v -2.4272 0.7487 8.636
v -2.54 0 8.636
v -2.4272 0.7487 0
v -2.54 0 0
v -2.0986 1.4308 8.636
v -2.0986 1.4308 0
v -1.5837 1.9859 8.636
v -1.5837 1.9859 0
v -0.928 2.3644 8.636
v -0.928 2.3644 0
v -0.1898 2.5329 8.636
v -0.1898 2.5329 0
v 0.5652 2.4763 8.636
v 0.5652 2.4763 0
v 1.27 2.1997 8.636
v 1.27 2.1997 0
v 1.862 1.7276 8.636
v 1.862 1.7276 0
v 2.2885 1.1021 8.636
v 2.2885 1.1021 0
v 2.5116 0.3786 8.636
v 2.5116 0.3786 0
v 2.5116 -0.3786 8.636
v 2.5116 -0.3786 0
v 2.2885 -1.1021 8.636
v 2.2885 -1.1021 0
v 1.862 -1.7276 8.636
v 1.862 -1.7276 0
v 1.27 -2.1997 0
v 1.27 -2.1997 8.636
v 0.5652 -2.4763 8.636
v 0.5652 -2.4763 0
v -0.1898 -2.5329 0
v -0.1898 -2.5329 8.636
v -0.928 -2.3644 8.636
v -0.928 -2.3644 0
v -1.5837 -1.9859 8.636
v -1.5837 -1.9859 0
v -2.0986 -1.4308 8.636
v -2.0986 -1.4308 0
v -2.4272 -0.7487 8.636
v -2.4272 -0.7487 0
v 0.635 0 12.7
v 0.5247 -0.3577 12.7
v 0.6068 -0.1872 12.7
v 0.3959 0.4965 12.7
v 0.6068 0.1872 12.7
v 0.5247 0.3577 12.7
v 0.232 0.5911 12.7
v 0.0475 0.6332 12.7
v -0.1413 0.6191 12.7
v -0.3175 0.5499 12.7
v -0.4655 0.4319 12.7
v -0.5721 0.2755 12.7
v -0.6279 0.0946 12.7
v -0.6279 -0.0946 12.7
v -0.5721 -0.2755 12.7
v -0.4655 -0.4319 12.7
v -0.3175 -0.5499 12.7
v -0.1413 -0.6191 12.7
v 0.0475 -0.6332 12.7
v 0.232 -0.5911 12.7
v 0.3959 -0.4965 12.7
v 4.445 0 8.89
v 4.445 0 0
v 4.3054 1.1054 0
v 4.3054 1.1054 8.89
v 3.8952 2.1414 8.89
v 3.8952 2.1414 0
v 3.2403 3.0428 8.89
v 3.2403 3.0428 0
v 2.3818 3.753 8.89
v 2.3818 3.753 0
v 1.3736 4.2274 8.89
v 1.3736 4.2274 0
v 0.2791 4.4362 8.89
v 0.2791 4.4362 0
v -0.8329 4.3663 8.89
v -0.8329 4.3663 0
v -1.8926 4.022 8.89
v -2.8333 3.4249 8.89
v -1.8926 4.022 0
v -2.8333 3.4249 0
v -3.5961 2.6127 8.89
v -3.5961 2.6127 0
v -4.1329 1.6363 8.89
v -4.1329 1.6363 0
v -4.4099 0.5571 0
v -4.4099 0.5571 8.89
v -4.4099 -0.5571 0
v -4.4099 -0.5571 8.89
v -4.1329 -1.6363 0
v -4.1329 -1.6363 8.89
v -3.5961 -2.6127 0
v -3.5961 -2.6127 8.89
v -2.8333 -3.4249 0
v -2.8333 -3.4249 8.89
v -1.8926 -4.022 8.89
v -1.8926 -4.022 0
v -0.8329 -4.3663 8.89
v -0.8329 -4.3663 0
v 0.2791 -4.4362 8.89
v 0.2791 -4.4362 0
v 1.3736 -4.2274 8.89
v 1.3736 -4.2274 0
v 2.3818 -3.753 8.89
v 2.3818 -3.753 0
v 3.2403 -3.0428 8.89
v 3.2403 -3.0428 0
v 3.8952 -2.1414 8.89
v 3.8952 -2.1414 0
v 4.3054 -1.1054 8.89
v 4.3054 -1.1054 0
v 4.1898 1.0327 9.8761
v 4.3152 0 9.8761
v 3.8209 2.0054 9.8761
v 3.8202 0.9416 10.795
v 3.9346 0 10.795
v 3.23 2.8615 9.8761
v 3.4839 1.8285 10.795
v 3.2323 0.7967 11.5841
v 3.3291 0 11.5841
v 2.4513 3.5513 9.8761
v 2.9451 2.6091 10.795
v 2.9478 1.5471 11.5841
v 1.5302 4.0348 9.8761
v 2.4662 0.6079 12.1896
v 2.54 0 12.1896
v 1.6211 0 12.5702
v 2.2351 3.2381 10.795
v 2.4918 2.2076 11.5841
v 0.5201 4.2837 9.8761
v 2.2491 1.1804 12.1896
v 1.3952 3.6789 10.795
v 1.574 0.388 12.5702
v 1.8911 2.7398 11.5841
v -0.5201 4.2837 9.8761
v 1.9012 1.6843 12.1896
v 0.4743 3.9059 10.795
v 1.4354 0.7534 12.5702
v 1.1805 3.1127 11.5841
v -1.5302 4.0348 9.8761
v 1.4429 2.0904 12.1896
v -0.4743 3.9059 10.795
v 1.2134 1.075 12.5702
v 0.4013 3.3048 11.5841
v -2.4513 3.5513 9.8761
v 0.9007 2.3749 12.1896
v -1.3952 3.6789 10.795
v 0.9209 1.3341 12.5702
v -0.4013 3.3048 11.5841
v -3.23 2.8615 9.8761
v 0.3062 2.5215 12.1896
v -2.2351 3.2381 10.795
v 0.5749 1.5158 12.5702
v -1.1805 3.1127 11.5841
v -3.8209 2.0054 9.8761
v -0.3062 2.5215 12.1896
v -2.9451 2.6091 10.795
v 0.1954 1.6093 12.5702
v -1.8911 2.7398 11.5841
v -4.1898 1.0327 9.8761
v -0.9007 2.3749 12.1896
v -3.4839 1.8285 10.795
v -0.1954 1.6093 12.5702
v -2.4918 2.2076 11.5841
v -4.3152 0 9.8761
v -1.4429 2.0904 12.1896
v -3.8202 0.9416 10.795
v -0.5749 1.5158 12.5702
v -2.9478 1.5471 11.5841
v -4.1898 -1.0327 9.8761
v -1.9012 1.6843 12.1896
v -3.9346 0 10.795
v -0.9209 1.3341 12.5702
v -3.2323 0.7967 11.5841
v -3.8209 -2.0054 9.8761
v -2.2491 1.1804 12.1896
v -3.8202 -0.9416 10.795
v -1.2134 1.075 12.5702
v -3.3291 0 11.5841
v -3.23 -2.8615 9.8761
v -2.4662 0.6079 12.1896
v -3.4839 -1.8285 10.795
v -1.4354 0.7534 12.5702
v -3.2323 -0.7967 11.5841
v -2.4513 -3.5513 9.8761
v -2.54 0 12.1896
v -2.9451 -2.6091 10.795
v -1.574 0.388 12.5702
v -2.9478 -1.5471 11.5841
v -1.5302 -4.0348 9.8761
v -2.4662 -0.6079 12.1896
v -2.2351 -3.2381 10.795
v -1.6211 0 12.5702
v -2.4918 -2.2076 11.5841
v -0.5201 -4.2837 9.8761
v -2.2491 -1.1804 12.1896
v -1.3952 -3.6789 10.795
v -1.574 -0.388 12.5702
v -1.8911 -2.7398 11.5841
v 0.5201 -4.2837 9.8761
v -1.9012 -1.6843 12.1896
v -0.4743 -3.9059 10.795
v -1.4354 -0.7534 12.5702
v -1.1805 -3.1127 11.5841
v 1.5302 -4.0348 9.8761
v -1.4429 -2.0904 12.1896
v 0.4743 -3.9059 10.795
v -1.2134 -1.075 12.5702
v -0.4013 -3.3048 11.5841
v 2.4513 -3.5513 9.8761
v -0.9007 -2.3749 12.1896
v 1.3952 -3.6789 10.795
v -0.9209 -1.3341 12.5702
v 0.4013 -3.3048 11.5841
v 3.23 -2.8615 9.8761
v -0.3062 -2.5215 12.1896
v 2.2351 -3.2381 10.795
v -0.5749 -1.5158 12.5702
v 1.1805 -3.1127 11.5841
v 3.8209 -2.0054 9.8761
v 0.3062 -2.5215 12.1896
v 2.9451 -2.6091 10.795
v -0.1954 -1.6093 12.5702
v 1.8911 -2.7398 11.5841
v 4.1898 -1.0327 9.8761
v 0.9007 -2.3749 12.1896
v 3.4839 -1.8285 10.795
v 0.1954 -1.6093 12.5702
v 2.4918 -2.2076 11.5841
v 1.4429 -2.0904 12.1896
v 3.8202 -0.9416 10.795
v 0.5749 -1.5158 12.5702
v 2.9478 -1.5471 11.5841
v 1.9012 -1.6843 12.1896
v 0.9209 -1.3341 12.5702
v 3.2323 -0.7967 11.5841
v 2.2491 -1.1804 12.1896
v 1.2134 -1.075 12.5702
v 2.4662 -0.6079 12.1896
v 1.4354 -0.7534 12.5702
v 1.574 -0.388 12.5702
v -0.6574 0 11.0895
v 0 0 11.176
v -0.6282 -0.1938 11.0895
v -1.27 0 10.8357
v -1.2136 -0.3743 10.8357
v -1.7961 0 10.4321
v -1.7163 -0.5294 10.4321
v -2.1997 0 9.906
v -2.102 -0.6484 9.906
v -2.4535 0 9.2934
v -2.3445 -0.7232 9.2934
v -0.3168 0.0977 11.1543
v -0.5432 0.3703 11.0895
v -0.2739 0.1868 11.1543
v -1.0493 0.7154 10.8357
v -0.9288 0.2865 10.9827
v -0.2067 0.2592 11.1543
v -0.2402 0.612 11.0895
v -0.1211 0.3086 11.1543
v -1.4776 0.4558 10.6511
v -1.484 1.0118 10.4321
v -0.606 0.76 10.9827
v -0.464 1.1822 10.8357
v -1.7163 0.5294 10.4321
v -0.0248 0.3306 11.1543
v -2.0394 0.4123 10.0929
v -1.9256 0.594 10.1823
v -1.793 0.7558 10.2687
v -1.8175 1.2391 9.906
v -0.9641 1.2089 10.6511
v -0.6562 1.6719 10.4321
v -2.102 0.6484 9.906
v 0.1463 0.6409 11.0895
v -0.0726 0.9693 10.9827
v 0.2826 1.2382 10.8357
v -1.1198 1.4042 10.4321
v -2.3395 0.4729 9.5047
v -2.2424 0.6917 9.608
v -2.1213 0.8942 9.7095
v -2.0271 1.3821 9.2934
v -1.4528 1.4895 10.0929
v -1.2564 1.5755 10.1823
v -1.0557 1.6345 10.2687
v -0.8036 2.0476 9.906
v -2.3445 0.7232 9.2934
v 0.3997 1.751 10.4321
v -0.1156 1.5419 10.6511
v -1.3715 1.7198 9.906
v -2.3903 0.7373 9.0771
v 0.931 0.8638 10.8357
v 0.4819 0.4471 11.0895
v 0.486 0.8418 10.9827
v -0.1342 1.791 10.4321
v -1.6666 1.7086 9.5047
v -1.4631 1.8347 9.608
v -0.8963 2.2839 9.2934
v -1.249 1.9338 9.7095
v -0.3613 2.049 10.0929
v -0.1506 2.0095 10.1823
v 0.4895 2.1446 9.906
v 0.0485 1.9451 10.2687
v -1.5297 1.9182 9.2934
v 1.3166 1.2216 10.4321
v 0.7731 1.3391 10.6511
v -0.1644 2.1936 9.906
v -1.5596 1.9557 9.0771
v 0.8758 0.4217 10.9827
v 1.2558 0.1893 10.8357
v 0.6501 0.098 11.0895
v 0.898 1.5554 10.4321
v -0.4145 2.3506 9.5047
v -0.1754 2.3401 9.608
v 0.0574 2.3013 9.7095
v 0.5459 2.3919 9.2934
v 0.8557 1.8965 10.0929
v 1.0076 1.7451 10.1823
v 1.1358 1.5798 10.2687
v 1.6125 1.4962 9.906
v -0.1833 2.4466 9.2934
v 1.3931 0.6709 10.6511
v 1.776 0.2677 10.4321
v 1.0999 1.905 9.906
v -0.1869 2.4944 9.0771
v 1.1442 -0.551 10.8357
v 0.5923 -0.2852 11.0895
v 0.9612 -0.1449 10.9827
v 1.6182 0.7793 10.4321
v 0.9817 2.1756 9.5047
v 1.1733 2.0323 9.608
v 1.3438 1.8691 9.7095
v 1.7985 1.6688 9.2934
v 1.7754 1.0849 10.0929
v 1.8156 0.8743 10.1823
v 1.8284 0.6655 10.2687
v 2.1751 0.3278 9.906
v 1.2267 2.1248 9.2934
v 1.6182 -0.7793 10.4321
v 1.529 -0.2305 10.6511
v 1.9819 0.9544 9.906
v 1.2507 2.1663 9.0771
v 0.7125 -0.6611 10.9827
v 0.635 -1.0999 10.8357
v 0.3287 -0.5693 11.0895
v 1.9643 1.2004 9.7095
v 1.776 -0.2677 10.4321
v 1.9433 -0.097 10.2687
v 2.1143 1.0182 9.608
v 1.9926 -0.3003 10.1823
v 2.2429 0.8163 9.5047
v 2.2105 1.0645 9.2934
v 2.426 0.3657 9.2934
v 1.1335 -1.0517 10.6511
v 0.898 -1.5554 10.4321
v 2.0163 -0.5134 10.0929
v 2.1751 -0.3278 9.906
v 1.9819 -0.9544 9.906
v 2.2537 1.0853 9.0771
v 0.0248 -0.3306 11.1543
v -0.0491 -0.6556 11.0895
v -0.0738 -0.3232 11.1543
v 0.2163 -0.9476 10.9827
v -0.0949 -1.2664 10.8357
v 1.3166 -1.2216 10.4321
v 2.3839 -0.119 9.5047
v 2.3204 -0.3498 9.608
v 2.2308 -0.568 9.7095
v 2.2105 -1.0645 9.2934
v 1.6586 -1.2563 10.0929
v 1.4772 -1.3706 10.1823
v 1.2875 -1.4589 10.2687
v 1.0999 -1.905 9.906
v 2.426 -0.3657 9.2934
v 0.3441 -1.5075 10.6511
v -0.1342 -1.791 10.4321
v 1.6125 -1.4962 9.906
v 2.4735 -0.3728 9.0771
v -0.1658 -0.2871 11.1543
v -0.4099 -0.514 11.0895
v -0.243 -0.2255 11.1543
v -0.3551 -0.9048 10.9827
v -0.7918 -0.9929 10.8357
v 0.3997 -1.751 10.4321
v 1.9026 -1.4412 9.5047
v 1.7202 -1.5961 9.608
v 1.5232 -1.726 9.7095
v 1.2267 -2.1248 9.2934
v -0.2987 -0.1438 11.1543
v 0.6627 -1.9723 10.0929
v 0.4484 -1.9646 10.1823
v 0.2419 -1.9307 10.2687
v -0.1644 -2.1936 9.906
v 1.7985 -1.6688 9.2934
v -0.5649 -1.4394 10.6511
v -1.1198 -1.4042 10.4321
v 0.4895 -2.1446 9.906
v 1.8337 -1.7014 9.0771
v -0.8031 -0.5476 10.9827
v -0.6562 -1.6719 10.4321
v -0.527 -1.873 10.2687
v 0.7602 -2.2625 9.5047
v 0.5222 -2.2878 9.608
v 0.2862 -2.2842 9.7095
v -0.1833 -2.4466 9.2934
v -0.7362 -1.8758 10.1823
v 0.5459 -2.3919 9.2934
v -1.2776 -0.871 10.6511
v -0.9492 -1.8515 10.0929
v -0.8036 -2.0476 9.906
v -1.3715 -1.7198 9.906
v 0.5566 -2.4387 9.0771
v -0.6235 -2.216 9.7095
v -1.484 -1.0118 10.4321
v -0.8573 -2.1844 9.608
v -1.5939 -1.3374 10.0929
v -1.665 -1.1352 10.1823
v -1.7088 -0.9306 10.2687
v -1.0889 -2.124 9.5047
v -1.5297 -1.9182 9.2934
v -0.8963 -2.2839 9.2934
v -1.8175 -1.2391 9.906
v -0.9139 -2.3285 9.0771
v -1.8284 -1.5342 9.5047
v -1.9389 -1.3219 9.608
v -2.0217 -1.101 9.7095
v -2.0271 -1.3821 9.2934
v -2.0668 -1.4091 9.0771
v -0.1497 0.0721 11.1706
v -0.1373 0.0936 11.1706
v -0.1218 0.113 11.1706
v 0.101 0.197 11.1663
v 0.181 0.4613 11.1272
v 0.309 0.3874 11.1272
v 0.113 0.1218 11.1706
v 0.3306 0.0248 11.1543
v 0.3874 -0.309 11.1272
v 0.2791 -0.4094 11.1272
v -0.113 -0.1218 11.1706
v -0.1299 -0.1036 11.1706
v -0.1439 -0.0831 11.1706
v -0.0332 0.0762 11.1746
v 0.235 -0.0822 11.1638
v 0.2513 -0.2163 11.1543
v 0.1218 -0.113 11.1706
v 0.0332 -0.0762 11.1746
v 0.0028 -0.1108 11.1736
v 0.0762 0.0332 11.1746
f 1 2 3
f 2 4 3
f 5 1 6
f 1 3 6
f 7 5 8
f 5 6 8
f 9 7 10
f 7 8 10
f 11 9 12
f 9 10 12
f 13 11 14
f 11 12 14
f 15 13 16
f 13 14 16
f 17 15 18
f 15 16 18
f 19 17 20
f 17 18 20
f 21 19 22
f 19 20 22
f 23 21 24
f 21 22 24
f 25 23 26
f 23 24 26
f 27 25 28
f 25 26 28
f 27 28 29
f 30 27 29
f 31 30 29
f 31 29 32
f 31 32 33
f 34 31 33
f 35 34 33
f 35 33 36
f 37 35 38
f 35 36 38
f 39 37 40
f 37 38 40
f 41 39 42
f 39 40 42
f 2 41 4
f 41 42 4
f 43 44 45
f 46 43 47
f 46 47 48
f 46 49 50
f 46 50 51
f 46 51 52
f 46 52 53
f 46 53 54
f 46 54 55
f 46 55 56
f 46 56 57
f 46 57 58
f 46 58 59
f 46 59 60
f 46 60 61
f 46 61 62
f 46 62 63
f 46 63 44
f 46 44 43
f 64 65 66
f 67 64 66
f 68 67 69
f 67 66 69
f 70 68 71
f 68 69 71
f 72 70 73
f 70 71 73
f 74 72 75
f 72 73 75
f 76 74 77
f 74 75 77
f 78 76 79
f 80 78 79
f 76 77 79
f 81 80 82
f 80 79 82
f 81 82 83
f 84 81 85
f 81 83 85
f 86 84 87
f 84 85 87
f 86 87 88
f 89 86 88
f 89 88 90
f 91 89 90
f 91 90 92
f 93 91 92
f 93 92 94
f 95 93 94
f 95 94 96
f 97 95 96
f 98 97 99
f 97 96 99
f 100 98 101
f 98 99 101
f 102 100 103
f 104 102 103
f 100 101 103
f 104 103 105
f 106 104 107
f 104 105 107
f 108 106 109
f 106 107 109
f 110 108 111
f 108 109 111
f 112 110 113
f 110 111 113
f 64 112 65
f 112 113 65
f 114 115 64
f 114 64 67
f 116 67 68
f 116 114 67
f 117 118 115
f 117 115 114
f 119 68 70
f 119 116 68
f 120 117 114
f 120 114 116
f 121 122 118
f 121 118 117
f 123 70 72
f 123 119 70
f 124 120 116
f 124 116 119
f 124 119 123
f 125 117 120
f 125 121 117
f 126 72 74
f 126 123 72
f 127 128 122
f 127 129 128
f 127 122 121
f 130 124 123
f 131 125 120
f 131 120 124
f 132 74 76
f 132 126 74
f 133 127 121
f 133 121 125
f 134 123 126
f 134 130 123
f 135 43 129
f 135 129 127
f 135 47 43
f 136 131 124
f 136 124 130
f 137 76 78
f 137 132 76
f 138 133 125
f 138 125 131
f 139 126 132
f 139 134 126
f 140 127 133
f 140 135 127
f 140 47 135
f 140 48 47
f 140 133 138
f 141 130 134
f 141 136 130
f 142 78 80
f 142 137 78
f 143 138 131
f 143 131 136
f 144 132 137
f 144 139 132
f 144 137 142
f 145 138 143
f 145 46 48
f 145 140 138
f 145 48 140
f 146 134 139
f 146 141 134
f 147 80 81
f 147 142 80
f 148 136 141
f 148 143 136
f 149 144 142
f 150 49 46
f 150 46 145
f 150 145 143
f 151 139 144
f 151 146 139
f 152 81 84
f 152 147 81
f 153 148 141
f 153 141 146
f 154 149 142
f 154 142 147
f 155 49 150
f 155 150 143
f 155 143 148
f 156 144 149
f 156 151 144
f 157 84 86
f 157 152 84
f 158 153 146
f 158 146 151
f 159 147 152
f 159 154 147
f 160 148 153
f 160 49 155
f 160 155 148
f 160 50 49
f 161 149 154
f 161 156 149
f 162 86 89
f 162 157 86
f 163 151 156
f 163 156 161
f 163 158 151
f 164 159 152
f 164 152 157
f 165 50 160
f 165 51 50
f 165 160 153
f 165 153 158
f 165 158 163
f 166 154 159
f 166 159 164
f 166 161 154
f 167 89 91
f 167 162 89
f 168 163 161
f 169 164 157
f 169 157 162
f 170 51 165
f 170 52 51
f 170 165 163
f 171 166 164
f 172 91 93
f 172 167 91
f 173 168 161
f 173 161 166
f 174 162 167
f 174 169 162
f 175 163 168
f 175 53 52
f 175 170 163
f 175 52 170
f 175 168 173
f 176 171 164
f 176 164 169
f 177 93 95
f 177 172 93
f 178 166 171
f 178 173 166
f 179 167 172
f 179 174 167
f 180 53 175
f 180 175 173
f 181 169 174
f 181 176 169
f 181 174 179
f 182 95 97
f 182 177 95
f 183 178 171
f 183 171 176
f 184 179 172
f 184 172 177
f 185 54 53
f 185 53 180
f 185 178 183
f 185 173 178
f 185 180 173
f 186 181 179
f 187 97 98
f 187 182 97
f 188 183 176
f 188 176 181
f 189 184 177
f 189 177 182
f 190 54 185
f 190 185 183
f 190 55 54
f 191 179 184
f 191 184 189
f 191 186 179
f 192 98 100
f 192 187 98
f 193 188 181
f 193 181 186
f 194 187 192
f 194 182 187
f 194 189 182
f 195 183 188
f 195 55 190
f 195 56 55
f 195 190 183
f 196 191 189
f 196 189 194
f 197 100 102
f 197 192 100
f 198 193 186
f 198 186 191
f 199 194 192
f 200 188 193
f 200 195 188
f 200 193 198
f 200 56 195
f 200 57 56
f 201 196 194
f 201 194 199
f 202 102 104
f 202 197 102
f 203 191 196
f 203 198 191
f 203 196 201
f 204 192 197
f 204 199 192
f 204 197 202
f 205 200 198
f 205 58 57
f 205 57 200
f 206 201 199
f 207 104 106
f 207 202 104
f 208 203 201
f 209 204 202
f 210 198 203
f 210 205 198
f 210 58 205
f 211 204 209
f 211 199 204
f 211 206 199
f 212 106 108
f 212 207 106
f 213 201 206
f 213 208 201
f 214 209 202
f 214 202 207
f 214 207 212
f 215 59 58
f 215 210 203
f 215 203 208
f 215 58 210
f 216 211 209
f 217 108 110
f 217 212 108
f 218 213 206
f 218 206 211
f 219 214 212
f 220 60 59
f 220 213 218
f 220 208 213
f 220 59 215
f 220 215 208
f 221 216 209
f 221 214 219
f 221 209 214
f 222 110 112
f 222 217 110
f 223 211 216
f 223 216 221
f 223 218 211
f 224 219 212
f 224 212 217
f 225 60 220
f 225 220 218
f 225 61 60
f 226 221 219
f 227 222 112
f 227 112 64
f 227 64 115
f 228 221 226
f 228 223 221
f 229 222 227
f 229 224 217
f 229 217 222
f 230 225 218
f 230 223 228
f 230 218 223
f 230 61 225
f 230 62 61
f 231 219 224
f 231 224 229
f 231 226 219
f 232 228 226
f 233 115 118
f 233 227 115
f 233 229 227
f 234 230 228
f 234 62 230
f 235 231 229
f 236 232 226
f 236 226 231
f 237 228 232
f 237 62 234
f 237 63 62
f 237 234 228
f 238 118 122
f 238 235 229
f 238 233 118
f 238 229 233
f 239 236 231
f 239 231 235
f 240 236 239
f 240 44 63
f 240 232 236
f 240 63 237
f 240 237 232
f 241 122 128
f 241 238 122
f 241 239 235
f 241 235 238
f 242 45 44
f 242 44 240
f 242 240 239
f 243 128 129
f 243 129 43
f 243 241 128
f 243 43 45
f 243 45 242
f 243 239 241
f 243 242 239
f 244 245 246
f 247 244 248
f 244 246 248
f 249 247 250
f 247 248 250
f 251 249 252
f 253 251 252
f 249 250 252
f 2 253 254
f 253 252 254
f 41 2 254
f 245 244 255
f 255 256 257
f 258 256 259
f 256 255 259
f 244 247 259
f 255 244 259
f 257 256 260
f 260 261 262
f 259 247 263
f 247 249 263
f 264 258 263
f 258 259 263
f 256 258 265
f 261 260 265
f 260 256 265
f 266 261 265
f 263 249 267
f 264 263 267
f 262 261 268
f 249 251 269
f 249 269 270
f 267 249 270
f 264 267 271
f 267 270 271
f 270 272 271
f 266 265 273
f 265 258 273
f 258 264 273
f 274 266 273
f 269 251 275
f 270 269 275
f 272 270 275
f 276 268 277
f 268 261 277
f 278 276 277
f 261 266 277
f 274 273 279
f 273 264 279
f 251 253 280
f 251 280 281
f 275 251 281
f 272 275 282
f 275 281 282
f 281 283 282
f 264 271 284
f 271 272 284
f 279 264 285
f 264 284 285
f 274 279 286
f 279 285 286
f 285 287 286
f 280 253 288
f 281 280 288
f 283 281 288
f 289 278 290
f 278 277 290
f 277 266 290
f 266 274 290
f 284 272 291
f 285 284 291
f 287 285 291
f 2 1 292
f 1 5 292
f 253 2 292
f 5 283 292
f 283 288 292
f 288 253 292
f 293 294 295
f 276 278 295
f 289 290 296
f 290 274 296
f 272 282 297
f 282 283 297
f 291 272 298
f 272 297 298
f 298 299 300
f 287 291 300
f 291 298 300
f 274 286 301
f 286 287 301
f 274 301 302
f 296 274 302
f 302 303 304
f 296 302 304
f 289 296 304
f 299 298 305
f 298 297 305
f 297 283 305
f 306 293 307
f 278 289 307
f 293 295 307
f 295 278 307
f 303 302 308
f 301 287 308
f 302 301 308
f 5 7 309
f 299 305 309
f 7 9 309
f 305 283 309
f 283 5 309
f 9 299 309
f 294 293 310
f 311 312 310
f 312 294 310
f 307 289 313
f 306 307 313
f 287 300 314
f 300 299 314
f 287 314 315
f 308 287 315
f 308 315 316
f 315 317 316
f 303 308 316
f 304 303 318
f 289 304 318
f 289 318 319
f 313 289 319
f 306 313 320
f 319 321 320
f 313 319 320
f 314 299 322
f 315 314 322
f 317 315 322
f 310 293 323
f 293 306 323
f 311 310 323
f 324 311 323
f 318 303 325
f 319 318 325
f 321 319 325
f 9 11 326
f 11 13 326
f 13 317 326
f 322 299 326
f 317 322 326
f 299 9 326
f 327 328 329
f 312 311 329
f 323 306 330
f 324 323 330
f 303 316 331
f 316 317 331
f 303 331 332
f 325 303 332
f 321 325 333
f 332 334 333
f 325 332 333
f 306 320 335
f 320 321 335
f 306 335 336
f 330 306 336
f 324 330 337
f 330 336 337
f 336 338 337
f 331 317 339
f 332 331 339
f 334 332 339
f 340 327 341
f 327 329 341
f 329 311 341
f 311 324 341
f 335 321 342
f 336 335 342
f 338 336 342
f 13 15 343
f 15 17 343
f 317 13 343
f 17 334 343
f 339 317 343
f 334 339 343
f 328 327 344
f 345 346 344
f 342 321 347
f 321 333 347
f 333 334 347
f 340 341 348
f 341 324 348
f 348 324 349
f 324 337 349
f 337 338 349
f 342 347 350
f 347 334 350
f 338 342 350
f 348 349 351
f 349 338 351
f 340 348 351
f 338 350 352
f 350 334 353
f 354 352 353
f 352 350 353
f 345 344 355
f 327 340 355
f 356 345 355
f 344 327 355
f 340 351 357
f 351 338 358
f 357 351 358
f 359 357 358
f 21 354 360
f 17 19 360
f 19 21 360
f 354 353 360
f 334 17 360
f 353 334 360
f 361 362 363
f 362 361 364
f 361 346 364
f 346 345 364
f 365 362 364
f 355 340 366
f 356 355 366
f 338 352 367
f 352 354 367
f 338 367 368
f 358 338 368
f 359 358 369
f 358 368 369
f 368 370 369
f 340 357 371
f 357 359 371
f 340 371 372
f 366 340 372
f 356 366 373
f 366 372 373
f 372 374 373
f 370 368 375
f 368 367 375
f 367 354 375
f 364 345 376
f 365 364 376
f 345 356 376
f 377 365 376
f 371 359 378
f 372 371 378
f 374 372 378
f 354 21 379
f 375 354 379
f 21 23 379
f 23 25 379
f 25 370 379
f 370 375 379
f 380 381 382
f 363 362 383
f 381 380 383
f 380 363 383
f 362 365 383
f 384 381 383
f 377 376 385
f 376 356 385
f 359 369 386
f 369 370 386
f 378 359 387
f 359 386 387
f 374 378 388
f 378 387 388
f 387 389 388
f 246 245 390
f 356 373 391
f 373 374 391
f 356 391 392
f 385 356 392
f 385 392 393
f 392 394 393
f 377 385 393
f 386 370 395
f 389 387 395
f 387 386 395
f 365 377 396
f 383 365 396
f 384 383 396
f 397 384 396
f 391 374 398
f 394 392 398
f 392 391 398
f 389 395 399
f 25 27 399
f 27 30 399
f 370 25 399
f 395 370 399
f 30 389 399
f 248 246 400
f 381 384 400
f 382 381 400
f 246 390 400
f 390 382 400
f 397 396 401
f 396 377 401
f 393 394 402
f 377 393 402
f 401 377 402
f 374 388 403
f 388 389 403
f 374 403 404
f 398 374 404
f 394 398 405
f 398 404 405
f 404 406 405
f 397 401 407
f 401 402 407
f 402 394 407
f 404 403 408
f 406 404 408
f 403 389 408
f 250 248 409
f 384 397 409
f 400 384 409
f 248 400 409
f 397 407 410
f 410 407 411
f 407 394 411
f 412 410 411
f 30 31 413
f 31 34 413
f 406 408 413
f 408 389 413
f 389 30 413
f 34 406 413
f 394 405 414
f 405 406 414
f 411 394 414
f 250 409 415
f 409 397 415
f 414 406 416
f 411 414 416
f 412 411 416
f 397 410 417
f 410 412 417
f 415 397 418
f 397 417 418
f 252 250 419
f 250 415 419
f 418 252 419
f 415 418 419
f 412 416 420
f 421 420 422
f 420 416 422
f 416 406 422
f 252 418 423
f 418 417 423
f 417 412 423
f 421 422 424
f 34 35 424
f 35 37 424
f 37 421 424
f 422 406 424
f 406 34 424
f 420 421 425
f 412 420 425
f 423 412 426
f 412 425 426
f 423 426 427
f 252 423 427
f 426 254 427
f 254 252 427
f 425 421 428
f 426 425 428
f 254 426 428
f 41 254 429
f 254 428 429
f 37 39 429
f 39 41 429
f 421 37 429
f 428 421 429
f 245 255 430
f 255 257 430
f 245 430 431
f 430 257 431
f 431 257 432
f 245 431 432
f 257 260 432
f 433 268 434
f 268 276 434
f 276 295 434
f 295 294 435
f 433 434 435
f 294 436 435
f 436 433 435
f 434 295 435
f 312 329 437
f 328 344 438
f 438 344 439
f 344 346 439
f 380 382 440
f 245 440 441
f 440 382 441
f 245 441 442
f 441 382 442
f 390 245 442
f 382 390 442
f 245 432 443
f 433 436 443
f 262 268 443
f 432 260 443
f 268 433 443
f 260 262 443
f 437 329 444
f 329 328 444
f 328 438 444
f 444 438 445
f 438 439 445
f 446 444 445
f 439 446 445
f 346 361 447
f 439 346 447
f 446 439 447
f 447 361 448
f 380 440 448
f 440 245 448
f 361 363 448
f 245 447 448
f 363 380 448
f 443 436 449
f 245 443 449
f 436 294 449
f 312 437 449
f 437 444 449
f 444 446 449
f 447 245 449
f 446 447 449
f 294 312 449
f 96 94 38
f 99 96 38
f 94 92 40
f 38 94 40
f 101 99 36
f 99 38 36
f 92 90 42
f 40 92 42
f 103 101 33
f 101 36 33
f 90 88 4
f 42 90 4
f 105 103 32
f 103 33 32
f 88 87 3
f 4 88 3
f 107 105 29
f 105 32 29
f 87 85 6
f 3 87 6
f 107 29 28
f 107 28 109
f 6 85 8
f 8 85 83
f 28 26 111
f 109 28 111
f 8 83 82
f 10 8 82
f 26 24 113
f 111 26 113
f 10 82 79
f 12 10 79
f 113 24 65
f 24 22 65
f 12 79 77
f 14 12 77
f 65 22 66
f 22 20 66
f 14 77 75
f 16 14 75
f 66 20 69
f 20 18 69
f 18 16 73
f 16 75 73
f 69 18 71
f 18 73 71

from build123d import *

# Parameters (mm, degrees)
F0_R     = 4.445
F1_DEPTH = 12.7
F2_R     = 3.81


with BuildPart() as f1:
    # F0 (on Top) → F1 (new body)
    with BuildSketch(Plane.XY):
        Circle(F0_R)
    extrude(amount=F1_DEPTH)

    # F2
    f2_edges = [f1.edges().sort_by_distance(p)[0] for p in [
        (-4.445, 0, 12.7),
    ]]
    fillet(f2_edges, radius=F2_R)

    # F3 (on Front) → F4 (revolve, cut)
    with BuildSketch(Plane.XZ):
        with BuildLine():
            Line((-2.54, 0), (0, 0))
            Line((0, 0), (0, 8.636))
            Line((0, 8.636), (0, 11.176))
            ThreePointArc((0, 11.176), (-1.796051, 10.432051), (-2.54, 8.636))
            Line((-2.54, 8.636), (-2.54, 0))
        make_face()
    revolve(axis=Axis((0, 0, 4.318), (0, 0, -1)), mode=Mode.SUBTRACT)


solid = f1.part
